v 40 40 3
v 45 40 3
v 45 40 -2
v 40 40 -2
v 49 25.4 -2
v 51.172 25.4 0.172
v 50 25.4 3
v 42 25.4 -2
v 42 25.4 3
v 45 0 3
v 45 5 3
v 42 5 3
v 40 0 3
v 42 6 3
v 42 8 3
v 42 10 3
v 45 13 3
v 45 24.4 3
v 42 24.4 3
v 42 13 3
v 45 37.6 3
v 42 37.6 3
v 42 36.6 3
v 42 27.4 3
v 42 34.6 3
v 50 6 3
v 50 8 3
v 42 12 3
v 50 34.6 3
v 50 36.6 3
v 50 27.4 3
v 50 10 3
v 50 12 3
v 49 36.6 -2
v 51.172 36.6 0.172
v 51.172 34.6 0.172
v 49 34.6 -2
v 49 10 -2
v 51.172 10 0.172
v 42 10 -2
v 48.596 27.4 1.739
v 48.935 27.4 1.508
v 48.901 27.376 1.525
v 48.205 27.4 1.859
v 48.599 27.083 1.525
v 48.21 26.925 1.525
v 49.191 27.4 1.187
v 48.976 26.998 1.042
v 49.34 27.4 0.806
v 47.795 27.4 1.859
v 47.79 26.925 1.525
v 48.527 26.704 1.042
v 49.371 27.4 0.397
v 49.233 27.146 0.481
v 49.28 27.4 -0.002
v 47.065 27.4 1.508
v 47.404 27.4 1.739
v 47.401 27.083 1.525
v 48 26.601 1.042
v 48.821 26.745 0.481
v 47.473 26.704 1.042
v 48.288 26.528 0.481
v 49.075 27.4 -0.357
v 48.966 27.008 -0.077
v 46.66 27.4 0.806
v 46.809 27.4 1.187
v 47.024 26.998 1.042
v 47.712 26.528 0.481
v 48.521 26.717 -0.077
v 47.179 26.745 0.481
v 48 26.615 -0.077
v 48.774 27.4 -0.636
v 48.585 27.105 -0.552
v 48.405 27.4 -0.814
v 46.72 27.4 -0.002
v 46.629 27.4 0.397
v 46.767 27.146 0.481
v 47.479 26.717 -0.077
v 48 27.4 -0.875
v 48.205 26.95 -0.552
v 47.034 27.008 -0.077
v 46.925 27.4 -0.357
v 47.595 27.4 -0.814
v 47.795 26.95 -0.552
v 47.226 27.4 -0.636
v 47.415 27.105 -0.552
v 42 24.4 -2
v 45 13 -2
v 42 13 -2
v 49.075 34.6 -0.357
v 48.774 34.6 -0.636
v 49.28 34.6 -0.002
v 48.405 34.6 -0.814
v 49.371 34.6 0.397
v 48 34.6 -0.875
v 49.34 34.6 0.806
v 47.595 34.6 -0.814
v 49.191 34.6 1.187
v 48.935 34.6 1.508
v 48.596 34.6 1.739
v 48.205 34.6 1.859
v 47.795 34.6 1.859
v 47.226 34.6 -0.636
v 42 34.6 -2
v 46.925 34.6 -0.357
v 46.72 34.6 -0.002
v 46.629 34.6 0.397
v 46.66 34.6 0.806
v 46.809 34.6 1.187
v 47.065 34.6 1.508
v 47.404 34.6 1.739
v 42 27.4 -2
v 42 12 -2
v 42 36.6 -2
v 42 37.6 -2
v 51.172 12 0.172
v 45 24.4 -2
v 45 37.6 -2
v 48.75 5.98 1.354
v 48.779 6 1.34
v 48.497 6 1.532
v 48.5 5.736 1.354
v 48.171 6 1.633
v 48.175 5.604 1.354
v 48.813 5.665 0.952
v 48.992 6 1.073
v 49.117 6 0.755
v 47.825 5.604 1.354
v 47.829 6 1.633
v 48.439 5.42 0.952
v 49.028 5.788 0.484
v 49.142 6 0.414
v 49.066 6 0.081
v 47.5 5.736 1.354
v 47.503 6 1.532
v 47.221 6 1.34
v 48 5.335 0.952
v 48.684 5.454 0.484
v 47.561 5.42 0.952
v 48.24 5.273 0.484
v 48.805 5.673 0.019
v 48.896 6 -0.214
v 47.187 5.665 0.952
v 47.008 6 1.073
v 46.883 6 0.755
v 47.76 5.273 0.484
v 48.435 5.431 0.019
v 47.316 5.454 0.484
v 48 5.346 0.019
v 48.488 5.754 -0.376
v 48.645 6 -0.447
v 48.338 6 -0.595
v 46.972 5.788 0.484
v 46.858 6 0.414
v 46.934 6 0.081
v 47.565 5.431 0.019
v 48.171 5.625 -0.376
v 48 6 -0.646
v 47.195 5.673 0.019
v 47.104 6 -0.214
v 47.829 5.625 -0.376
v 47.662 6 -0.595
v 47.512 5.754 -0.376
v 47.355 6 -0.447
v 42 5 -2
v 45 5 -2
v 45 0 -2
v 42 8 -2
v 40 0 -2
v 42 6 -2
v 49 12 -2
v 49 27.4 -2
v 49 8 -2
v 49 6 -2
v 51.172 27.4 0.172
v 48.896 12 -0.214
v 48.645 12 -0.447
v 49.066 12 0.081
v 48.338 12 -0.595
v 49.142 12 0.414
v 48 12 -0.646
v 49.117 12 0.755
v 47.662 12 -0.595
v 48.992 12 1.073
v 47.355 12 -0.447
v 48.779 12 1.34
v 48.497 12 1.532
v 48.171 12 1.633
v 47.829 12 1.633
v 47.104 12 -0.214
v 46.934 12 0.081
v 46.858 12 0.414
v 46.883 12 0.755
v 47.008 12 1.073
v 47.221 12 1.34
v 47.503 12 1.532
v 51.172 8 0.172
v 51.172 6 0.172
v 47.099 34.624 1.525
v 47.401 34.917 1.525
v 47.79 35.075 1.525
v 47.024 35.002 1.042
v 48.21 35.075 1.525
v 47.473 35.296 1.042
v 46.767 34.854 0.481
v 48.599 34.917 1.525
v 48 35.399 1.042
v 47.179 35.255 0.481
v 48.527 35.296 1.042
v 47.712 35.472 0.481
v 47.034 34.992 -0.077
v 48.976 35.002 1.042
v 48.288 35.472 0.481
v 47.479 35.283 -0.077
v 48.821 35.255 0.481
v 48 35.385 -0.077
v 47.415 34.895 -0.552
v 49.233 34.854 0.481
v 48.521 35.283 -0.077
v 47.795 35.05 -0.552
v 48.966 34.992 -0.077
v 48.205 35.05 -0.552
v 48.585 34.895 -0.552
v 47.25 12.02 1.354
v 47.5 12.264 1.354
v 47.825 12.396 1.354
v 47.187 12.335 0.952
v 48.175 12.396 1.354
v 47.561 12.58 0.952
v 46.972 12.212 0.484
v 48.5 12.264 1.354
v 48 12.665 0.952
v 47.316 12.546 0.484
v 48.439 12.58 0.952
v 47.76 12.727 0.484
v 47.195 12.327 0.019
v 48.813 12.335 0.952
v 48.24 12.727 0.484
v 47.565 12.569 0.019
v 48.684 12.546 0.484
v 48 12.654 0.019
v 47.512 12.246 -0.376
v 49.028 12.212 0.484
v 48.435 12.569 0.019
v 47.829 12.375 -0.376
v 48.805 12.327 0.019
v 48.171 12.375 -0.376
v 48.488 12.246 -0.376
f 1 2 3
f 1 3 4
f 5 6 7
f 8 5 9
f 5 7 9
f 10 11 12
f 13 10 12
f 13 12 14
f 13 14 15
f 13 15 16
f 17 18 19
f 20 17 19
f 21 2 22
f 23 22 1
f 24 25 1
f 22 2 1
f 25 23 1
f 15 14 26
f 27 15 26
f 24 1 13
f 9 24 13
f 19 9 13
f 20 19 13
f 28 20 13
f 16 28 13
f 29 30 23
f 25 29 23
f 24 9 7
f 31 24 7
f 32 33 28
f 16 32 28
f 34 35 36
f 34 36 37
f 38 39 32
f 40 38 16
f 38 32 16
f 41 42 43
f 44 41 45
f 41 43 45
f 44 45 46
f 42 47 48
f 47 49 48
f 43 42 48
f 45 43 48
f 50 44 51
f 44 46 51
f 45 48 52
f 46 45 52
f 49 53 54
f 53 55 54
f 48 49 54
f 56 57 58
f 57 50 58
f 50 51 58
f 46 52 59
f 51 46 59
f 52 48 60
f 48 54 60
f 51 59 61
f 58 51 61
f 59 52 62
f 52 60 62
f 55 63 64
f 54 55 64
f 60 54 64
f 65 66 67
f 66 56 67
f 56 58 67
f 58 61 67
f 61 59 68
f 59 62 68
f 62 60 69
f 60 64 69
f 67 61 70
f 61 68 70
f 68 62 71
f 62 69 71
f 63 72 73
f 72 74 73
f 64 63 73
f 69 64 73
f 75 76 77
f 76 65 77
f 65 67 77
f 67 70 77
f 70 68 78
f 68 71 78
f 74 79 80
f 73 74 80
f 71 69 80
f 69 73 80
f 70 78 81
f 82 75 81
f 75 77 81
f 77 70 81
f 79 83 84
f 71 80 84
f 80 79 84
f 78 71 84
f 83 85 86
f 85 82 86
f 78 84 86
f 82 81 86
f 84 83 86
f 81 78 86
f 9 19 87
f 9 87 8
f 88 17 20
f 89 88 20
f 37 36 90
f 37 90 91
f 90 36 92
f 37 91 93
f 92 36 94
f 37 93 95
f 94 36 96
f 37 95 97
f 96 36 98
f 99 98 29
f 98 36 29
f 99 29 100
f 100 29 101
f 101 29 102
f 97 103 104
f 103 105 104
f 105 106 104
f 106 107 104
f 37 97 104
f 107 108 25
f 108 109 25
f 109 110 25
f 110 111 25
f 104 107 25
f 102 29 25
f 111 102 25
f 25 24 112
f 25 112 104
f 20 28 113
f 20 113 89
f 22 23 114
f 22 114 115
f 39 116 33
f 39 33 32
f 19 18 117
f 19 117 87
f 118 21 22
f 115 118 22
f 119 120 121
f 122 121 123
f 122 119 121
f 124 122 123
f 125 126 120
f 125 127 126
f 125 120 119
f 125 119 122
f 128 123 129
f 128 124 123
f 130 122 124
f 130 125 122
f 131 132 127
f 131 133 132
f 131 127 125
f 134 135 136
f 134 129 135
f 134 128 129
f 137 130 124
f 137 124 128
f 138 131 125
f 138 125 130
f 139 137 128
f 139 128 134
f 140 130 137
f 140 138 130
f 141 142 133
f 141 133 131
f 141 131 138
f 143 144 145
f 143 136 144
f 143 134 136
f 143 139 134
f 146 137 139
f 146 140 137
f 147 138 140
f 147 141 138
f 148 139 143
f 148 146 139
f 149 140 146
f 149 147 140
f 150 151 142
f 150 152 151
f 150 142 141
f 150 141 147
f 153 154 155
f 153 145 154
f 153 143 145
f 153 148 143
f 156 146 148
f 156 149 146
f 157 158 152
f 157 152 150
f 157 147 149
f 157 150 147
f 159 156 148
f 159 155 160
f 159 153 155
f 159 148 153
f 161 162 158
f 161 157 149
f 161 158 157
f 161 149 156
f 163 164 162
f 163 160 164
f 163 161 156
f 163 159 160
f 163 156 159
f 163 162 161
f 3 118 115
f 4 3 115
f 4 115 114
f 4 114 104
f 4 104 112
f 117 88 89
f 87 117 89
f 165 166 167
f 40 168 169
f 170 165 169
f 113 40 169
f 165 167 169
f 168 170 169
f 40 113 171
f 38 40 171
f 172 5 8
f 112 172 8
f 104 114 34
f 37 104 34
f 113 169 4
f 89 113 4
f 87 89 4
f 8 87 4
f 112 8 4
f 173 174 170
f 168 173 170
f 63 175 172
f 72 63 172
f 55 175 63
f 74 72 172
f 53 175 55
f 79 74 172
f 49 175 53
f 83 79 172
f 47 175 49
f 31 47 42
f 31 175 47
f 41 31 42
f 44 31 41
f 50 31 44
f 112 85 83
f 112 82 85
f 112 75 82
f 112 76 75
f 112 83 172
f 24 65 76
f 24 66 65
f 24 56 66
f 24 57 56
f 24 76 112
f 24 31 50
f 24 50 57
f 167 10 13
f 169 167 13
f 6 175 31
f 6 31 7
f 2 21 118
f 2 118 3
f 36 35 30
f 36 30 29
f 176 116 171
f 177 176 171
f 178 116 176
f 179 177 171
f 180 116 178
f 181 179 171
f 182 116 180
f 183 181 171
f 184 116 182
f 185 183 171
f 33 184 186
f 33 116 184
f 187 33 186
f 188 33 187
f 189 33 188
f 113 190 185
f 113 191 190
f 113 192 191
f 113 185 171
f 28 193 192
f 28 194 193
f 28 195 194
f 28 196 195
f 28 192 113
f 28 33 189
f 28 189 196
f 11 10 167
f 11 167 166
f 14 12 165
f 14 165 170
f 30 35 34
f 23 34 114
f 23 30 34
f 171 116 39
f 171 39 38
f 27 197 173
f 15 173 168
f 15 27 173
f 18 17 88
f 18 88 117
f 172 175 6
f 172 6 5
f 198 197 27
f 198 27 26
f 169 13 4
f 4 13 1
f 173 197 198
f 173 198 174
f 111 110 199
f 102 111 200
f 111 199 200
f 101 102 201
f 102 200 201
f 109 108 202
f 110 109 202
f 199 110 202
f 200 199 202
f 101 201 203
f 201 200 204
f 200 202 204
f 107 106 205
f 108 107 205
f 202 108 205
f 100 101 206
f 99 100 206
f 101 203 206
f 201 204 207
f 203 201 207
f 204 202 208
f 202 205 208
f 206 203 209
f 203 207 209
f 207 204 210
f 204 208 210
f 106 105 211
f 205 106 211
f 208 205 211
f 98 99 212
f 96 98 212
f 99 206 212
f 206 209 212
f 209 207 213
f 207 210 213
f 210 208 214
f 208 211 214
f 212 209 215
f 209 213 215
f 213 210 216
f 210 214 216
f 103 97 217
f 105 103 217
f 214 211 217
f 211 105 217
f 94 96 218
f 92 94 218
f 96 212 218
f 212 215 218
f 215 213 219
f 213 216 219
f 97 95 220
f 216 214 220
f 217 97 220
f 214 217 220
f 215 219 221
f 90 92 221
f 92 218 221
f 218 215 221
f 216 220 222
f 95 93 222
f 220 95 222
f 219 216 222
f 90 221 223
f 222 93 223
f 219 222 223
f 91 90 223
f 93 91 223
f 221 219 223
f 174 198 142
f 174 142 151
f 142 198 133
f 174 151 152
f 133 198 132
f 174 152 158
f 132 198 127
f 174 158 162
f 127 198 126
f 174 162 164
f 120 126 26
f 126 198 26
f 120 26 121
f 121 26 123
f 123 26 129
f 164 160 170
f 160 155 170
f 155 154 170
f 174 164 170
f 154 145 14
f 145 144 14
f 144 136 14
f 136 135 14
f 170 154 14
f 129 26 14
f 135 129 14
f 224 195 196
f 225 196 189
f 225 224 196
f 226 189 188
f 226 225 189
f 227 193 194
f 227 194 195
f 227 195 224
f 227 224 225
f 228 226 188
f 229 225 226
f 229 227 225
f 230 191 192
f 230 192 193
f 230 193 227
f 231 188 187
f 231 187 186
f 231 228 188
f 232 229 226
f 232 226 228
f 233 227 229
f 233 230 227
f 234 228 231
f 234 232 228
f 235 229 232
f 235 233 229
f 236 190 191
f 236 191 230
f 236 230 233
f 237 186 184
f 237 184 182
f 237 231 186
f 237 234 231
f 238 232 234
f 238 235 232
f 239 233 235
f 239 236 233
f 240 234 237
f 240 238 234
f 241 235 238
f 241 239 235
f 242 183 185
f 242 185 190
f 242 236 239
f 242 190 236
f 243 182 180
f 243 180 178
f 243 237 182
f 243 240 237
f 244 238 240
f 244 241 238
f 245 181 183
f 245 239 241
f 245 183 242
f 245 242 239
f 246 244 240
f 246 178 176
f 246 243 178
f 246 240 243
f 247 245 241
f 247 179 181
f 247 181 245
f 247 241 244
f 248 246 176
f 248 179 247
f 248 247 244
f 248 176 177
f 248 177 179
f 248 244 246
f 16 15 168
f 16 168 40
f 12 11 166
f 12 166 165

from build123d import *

# Parameters (mm, degrees)
BOX124_W               = 12
BOX124_H               = 44
BOX124_DEPTH           = 10
BOX119_W               = 4
BOX119_H               = 1
BOX119_DEPTH           = 7
BOX127_W               = 4
BOX127_H               = 1
BOX127_DEPTH           = 7
BOX128_W               = 4
BOX128_H               = 2
BOX128_DEPTH           = 7
BOX130_W               = 4
BOX130_H               = 1
BOX130_DEPTH           = 7
BOX122_W               = 4
BOX122_H               = 1
BOX122_DEPTH           = 7
BOX121_W               = 4
BOX121_H               = 7.2
BOX121_DEPTH           = 7
BOX120_W               = 13
BOX120_H               = 40
BOX120_DEPTH           = 10
BOX120_PITCH_ANGLE     = -45
BOX123_W               = 10
BOX123_H               = 2
BOX123_DEPTH           = 7
BOX126_W               = 10
BOX126_H               = 2
BOX126_DEPTH           = 7
BOX125_W               = 10
BOX125_H               = 2
BOX125_DEPTH           = 7
BOX129_W               = 10
BOX129_H               = 2
BOX129_DEPTH           = 7
BOX131_W               = 5
BOX131_H               = 40
BOX131_DEPTH           = 7
CHAMFER011_SIZE        = 4
CUT034_PLACEMENT_ANGLE = 180
CUT033_PLACEMENT_ANGLE = 180


with BuildPart() as cube108:
    # Box124 → Box124 (new body)
    with BuildSketch(Plane(origin=(-11, -2, -12), x_dir=(1, 0, 0), z_dir=(0, 0, 1))):
        with Locations((6, 22)):
            Rectangle(BOX124_W, BOX124_H)
    extrude(amount=BOX124_DEPTH)


with BuildPart() as cube103:
    # Box119 → Box119 (new body)
    with BuildSketch(Plane(origin=(-1, 12, 0), x_dir=(1, 0, 0), z_dir=(0, 0, 1))):
        with Locations((2, 0.5)):
            Rectangle(BOX119_W, BOX119_H)
    extrude(amount=BOX119_DEPTH)


with BuildPart() as cube111:
    # Box127 → Box127 (new body)
    with BuildSketch(Plane(origin=(-1, 36.6, 0), x_dir=(1, 0, 0), z_dir=(0, 0, 1))):
        with Locations((2, 0.5)):
            Rectangle(BOX127_W, BOX127_H)
    extrude(amount=BOX127_DEPTH)


with BuildPart() as cube112:
    # Box128 → Box128 (new body)
    with BuildSketch(Plane(origin=(-1, 8, 0), x_dir=(1, 0, 0), z_dir=(0, 0, 1))):
        with Locations((2, 1)):
            Rectangle(BOX128_W, BOX128_H)
    extrude(amount=BOX128_DEPTH)


with BuildPart() as cube114:
    # Box130 → Box130 (new body)
    with BuildSketch(Plane(origin=(-1, 24.4, 0), x_dir=(1, 0, 0), z_dir=(0, 0, 1))):
        with Locations((2, 0.5)):
            Rectangle(BOX130_W, BOX130_H)
    extrude(amount=BOX130_DEPTH)


with BuildPart() as cube106:
    # Box122 → Box122 (new body)
    with BuildSketch(Plane(origin=(-1, 5, 0), x_dir=(1, 0, 0), z_dir=(0, 0, 1))):
        with Locations((2, 0.5)):
            Rectangle(BOX122_W, BOX122_H)
    extrude(amount=BOX122_DEPTH)


with BuildPart() as fusion038:
    # Box121 → Box121 (new body)
    with BuildSketch(Plane(origin=(-1, 27.4, 0), x_dir=(1, 0, 0), z_dir=(0, 0, 1))):
        with Locations((2, 3.6)):
            Rectangle(BOX121_W, BOX121_H)
    extrude(amount=BOX121_DEPTH)

    # Fusion038: union Cube103, Cube111, Cube112, Cube114, Cube106
    add(cube103.part)
    add(cube111.part)
    add(cube112.part)
    add(cube114.part)
    add(cube106.part)


with BuildPart() as sphere044:
    # Sphere044 → Sphere044 (revolve)
    with BuildSketch(Plane(origin=(-3, 28, 2.5), x_dir=(1, 0, 0), z_dir=(0, -1, 0))):
        with BuildLine():
            ThreePointArc((0, -1.5), (1.5, 0), (0, 1.5))
            Line((0, 1.5), (0, -1.5))
        make_face()
    revolve(axis=Axis((-3, 28, 2.5), (0, 0, 1)))


with BuildPart() as fusion040:
    # Sphere046 → Sphere046 (revolve)
    with BuildSketch(Plane(origin=(-3, 34, 2.5), x_dir=(1, 0, 0), z_dir=(0, -1, 0))):
        with BuildLine():
            ThreePointArc((0, -1.5), (1.5, 0), (0, 1.5))
            Line((0, 1.5), (0, -1.5))
        make_face()
    revolve(axis=Axis((-3, 34, 2.5), (0, 0, 1)))

    # Fusion040: union Sphere044
    add(sphere044.part)


with BuildPart() as sphere045:
    # Sphere045 → Sphere045 (revolve)
    with BuildSketch(Plane(origin=(-3, 11.5, 2.5), x_dir=(1, 0, 0), z_dir=(0, -1, 0))):
        with BuildLine():
            ThreePointArc((0, -1.25), (1.25, 0), (0, 1.25))
            Line((0, 1.25), (0, -1.25))
        make_face()
    revolve(axis=Axis((-3, 11.5, 2.5), (0, 0, 1)))


with BuildPart() as cube104:
    # Box120 → Box120 (new body)
    with BuildSketch(Plane.XY):
        with Locations((6.5, 20)):
            Rectangle(BOX120_W, BOX120_H)
    extrude(amount=BOX120_DEPTH)


with BuildPart() as cube104_1:
    # Box120 pitch: moved
    add(cube104.part.rotate(Axis((0, 0, 0), (0, 1, 0)), BOX120_PITCH_ANGLE))


with BuildPart() as cube104_2:
    # Box120 placement: moved
    add(cube104_1.part.moved(Location((-10.19, 0, -1.19))))


with BuildPart() as cube107:
    # Box123 → Box123 (new body)
    with BuildSketch(Plane(origin=(-10, 6, 0), x_dir=(1, 0, 0), z_dir=(0, 0, 1))):
        with Locations((5, 1)):
            Rectangle(BOX123_W, BOX123_H)
    extrude(amount=BOX123_DEPTH)


with BuildPart() as cube110:
    # Box126 → Box126 (new body)
    with BuildSketch(Plane(origin=(-10, 10, 0), x_dir=(1, 0, 0), z_dir=(0, 0, 1))):
        with Locations((5, 1)):
            Rectangle(BOX126_W, BOX126_H)
    extrude(amount=BOX126_DEPTH)


with BuildPart() as cube109:
    # Box125 → Box125 (new body)
    with BuildSketch(Plane(origin=(-10, 25.4, 0), x_dir=(1, 0, 0), z_dir=(0, 0, 1))):
        with Locations((5, 1)):
            Rectangle(BOX125_W, BOX125_H)
    extrude(amount=BOX125_DEPTH)


with BuildPart() as cube113:
    # Box129 → Box129 (new body)
    with BuildSketch(Plane(origin=(-10, 34.6, 0), x_dir=(1, 0, 0), z_dir=(0, 0, 1))):
        with Locations((5, 1)):
            Rectangle(BOX129_W, BOX129_H)
    extrude(amount=BOX129_DEPTH)


with BuildPart() as cut035:
    # Box131 → Box131 (new body)
    with BuildSketch(Plane.XY):
        with Locations((2.5, 20)):
            Rectangle(BOX131_W, BOX131_H)
    extrude(amount=BOX131_DEPTH)

    # Fusion041: union Cube107, Cube110, Cube109, Cube113
    add(cube107.part)
    add(cube110.part)
    add(cube109.part)
    add(cube113.part)

    # Cut035: cut Cube104
    add(cube104_2.part, mode=Mode.SUBTRACT)


with BuildPart() as cut033:
    # Sphere043 → Sphere043 (revolve)
    with BuildSketch(Plane(origin=(-3, 6.5, 2.5), x_dir=(1, 0, 0), z_dir=(0, -1, 0))):
        with BuildLine():
            ThreePointArc((0, -1.25), (1.25, 0), (0, 1.25))
            Line((0, 1.25), (0, -1.25))
        make_face()
    revolve(axis=Axis((-3, 6.5, 2.5), (0, 0, 1)))

    # Fusion039: union Sphere045, Cut035
    add(sphere045.part)
    add(cut035.part)

    # Cut036: cut Fusion040
    add(fusion040.part, mode=Mode.SUBTRACT)

    # Chamfer011
    chamfer011_edges = [cut033.edges().sort_by_distance(p)[0] for p in [
        (-9, 7, 0),
        (-9, 11, 0),
        (-9, 35.6, 0),
        (-9, 26.4, 0),
    ]]
    chamfer(chamfer011_edges, length=CHAMFER011_SIZE)

    # Cut034: cut Fusion038
    add(fusion038.part, mode=Mode.SUBTRACT)


with BuildPart() as cut033_1:
    # Cut034 placement: moved
    add(cut033.part.moved(Location((-5, 40, 3))).rotate(Axis((-5, 40, 3), (1, 0, 0)), CUT034_PLACEMENT_ANGLE))

    # Cut033: cut Cube108
    add(cube108.part, mode=Mode.SUBTRACT)


with BuildPart() as cut033_2:
    # Cut033 placement: moved
    add(cut033_1.part.moved(Location((40, 40, 0))).rotate(Axis((40, 40, 0), (0, 0, 1)), CUT033_PLACEMENT_ANGLE))


solid = cut033_2.part
